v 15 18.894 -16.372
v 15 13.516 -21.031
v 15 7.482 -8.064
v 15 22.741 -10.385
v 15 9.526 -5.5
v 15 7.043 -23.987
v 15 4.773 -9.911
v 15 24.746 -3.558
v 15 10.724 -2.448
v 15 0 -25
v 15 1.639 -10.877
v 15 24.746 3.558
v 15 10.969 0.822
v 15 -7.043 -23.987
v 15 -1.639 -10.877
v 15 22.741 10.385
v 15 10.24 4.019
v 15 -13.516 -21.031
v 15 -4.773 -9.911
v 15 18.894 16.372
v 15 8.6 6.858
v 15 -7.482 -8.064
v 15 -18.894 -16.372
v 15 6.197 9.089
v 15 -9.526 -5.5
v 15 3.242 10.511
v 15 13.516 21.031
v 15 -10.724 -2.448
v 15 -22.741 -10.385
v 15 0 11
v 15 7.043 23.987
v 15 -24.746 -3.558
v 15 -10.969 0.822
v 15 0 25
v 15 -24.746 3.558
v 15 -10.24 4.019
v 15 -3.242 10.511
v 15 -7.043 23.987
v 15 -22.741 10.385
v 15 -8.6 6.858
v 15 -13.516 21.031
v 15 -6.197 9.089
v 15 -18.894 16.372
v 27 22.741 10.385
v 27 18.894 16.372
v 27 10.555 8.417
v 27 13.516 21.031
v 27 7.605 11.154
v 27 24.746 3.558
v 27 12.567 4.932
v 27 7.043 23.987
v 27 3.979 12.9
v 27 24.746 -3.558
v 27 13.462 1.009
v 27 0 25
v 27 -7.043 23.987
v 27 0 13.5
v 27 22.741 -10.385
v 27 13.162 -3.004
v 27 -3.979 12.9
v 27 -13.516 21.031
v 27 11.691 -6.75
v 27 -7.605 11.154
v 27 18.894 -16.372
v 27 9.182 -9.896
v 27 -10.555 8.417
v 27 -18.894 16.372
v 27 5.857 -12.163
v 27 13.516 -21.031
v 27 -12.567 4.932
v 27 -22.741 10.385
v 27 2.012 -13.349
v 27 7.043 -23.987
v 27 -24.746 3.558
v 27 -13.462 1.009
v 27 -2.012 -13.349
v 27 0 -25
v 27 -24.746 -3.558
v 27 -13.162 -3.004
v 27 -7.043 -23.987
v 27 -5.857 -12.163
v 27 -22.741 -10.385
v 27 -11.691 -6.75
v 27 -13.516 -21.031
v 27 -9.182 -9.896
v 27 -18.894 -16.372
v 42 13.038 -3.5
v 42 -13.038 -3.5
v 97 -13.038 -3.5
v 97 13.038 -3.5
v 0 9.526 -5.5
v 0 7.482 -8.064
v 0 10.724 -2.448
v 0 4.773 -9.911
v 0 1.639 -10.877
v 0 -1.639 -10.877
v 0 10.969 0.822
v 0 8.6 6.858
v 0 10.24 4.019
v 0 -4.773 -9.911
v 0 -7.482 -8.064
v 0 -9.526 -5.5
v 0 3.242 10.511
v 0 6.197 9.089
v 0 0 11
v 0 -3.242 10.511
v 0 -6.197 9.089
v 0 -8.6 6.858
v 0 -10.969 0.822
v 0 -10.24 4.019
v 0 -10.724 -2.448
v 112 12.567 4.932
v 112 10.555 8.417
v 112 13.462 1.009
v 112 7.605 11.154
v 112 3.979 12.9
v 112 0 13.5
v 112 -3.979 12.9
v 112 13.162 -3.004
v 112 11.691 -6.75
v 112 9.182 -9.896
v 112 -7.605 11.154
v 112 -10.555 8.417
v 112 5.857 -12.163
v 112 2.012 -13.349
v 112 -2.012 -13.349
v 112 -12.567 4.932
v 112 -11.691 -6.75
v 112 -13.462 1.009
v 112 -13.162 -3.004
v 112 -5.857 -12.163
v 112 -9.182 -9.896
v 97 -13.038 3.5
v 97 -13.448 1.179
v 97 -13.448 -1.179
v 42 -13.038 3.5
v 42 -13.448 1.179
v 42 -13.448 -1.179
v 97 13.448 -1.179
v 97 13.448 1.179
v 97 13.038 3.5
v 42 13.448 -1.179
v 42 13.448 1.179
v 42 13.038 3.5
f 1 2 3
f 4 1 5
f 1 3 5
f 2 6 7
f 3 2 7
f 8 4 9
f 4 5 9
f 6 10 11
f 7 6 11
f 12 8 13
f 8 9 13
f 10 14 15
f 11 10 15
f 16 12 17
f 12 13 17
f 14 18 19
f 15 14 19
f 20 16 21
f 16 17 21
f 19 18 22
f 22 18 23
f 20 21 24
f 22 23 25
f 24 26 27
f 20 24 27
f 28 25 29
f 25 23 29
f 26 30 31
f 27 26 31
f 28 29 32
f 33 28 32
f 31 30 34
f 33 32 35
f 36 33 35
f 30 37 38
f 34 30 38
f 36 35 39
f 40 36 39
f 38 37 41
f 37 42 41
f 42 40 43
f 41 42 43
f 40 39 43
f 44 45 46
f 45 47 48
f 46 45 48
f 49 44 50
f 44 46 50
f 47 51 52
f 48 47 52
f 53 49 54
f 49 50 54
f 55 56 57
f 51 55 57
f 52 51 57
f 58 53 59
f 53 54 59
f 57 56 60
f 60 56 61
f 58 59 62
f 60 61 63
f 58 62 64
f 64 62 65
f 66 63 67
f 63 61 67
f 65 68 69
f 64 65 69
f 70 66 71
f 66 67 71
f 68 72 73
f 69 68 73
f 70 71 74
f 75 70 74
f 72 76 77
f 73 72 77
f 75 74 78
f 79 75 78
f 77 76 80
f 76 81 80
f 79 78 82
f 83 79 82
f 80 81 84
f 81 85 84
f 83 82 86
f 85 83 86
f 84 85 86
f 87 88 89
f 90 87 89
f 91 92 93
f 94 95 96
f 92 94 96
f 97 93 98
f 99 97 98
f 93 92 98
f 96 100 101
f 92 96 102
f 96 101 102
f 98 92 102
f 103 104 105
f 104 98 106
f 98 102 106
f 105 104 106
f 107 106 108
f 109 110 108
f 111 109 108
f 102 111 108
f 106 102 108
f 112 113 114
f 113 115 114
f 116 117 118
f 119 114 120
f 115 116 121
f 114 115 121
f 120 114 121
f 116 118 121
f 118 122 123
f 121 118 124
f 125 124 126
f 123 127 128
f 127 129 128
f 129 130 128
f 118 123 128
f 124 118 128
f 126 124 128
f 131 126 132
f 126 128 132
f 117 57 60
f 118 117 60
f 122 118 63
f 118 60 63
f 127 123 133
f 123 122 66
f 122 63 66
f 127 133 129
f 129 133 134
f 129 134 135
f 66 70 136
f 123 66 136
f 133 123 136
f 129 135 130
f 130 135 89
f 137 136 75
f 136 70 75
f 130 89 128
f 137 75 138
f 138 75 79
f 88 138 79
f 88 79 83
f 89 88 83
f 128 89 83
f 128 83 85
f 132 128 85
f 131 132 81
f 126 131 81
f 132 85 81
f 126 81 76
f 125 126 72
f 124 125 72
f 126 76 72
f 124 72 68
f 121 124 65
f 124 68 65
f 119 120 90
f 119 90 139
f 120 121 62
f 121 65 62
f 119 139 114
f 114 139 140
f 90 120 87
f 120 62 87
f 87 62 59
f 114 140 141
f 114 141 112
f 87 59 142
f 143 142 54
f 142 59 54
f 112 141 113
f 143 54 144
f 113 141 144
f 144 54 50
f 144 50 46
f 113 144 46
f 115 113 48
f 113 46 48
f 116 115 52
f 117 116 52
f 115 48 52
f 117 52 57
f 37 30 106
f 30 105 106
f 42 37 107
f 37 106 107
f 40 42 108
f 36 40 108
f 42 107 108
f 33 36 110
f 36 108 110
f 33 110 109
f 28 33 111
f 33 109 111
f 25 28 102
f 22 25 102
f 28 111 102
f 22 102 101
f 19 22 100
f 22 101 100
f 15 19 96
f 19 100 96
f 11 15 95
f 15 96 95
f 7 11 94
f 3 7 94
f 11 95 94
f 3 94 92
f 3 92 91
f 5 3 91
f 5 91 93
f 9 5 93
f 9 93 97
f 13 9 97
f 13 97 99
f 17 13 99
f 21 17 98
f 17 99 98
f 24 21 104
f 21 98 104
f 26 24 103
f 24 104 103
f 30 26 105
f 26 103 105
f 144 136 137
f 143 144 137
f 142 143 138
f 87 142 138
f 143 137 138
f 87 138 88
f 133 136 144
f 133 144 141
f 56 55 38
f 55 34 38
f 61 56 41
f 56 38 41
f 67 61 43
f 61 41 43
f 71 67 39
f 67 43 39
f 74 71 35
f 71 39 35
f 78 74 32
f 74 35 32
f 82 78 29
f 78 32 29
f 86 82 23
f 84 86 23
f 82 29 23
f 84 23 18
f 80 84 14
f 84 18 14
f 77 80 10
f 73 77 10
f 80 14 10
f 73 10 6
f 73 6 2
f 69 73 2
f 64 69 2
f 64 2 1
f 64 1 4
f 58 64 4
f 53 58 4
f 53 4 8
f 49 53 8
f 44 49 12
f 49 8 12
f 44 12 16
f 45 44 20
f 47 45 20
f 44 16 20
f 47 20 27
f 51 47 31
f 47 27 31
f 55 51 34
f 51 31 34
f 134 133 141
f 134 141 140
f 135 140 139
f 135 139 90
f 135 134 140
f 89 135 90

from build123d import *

# Parameters (mm, degrees)
CUT_EXTRUDE1_DEPTH      = 118.447860772
CUT_EXTRUDE1_DEPTH_BACK = 118.447860772
SKETCH4_W               = 55
SKETCH4_H               = 7


with BuildPart() as part:
    # Sketch1 → Revolve3 (revolve)
    with BuildSketch(Plane(origin=(0, 0, 0), x_dir=(1, 0, 0), z_dir=(0, 1, 0)), mode=Mode.PRIVATE) as revolve3_sk:
        Polygon((0, 0), (112, 0), (112, 13.5), (27, 13.5), (27, 25), (15, 25), (15, 11), (0, 11), align=None)
    revolve(revolve3_sk.sketch.rotate(Axis((0, 0, 0), (1, 0, 0)), 180), axis=Axis((0, 0, 0), (1, 0, 0)))

    # Sketch4 → Cut-Extrude1 (cut, two sides: drawn at the far end of the back side and taken through both)
    with BuildSketch(Plane(origin=(0, 0, 0), x_dir=(1, 0, 0), z_dir=(0, 1, 0)).offset(-CUT_EXTRUDE1_DEPTH_BACK)):
        with Locations((69.5, 0)):
            Rectangle(SKETCH4_W, SKETCH4_H)
    extrude(amount=CUT_EXTRUDE1_DEPTH + CUT_EXTRUDE1_DEPTH_BACK, mode=Mode.SUBTRACT)


solid = part.part
